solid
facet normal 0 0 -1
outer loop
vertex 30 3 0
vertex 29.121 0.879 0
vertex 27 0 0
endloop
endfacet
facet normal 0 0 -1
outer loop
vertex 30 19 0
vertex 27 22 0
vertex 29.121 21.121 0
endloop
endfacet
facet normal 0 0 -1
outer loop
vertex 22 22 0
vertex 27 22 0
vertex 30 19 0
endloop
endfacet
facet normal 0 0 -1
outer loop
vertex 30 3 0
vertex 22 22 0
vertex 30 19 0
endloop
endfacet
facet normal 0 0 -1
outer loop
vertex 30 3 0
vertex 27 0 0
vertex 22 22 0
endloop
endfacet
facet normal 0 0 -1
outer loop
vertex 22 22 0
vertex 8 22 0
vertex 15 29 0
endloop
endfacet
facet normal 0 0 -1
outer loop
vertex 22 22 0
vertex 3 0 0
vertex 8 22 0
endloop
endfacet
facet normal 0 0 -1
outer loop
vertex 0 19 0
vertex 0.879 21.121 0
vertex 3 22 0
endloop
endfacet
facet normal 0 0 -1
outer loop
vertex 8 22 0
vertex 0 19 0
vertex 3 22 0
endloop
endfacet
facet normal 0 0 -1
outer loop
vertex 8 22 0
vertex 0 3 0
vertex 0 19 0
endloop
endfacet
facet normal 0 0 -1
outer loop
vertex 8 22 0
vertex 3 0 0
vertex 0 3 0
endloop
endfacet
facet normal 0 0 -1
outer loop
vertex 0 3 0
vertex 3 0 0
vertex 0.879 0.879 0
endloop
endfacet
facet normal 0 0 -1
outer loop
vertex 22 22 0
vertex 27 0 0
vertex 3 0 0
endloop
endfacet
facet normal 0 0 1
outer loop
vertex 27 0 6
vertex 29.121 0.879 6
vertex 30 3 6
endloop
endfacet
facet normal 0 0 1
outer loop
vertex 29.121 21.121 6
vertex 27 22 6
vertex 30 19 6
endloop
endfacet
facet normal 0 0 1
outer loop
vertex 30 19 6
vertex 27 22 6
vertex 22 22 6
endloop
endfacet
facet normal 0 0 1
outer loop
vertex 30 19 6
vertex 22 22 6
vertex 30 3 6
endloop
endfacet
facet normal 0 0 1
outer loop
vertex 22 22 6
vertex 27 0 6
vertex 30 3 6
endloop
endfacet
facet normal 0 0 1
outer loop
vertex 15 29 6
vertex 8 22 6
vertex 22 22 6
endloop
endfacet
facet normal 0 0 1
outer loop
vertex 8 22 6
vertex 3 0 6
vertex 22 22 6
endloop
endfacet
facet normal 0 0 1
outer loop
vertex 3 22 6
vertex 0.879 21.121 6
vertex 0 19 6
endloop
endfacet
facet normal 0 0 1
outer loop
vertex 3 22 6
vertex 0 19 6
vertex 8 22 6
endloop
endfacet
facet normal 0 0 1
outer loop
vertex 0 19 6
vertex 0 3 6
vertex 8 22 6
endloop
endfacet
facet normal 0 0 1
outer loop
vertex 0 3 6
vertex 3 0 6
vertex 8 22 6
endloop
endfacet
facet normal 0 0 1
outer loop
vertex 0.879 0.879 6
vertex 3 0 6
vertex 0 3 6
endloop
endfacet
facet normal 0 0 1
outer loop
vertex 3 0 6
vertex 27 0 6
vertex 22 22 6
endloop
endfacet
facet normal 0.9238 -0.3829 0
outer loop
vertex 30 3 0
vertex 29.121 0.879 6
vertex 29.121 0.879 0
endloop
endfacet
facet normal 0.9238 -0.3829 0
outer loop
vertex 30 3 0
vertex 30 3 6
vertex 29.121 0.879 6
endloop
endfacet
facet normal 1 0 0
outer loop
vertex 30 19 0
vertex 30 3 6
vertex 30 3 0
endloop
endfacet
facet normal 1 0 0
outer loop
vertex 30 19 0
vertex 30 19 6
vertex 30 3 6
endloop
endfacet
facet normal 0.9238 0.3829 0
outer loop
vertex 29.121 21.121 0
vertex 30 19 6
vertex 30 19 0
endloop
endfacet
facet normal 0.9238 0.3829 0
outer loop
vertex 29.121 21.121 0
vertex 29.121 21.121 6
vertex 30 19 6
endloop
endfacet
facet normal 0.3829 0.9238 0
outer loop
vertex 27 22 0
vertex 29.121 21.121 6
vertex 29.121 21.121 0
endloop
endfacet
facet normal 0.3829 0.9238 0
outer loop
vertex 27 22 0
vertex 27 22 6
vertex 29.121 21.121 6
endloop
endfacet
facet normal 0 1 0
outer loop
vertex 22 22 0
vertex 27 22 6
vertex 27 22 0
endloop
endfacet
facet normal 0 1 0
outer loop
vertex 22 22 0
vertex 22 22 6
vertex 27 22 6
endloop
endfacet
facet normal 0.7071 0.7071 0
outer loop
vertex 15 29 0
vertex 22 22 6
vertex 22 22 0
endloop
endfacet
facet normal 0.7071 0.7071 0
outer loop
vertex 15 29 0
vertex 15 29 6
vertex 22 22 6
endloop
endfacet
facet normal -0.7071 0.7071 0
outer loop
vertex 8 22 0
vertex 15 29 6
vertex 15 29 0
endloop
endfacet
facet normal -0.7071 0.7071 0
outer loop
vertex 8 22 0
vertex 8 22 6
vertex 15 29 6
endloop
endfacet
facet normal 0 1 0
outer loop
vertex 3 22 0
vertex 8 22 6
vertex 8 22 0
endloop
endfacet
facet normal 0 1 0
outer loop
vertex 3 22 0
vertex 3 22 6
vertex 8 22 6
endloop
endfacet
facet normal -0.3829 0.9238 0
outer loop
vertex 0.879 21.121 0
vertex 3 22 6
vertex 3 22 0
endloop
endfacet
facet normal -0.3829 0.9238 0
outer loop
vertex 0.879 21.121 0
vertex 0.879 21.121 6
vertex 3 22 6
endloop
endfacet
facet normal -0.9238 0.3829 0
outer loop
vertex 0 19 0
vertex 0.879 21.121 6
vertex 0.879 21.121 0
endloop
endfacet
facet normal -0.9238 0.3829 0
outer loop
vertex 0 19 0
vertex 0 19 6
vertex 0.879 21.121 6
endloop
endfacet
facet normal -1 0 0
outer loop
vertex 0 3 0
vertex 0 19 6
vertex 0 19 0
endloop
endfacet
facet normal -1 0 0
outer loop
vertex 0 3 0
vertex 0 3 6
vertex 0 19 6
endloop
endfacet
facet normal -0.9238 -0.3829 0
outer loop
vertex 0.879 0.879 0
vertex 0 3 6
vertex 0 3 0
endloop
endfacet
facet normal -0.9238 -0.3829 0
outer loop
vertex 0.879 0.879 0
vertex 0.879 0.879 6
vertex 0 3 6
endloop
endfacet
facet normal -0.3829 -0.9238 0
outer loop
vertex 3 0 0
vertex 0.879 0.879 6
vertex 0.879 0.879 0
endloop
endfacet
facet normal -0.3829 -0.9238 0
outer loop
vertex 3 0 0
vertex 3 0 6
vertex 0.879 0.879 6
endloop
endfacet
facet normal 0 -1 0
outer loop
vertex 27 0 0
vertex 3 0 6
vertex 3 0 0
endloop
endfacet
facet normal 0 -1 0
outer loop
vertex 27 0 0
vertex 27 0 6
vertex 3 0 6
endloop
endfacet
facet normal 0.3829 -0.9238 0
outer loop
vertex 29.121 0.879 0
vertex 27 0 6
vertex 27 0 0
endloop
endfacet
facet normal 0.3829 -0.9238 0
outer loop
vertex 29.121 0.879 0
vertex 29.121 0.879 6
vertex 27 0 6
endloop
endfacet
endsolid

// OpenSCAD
$fn = 32;

// ----------------------------------------------------------------------
// Ratchet pawl: 30 x 22 mm body, beak 7 mm сверху
// ----------------------------------------------------------------------

// --- parameters (mm) ---
profile_height = 6;       // extrusion height
profile_points = 15;      // points of the closed outline

profile = [[0, 3], [0.879, 0.879], [3, 0], [27, 0], [29.121, 0.879], [30, 3], [30, 19], [29.121, 21.121], [27, 22], [22, 22], [15, 29], [8, 22], [3, 22], [0.879, 21.121], [0, 19]];  // single closed polygon, 15 points, counter clockwise

// --- the one profile operation ---
linear_extrude(height = profile_height) polygon(points = profile);
